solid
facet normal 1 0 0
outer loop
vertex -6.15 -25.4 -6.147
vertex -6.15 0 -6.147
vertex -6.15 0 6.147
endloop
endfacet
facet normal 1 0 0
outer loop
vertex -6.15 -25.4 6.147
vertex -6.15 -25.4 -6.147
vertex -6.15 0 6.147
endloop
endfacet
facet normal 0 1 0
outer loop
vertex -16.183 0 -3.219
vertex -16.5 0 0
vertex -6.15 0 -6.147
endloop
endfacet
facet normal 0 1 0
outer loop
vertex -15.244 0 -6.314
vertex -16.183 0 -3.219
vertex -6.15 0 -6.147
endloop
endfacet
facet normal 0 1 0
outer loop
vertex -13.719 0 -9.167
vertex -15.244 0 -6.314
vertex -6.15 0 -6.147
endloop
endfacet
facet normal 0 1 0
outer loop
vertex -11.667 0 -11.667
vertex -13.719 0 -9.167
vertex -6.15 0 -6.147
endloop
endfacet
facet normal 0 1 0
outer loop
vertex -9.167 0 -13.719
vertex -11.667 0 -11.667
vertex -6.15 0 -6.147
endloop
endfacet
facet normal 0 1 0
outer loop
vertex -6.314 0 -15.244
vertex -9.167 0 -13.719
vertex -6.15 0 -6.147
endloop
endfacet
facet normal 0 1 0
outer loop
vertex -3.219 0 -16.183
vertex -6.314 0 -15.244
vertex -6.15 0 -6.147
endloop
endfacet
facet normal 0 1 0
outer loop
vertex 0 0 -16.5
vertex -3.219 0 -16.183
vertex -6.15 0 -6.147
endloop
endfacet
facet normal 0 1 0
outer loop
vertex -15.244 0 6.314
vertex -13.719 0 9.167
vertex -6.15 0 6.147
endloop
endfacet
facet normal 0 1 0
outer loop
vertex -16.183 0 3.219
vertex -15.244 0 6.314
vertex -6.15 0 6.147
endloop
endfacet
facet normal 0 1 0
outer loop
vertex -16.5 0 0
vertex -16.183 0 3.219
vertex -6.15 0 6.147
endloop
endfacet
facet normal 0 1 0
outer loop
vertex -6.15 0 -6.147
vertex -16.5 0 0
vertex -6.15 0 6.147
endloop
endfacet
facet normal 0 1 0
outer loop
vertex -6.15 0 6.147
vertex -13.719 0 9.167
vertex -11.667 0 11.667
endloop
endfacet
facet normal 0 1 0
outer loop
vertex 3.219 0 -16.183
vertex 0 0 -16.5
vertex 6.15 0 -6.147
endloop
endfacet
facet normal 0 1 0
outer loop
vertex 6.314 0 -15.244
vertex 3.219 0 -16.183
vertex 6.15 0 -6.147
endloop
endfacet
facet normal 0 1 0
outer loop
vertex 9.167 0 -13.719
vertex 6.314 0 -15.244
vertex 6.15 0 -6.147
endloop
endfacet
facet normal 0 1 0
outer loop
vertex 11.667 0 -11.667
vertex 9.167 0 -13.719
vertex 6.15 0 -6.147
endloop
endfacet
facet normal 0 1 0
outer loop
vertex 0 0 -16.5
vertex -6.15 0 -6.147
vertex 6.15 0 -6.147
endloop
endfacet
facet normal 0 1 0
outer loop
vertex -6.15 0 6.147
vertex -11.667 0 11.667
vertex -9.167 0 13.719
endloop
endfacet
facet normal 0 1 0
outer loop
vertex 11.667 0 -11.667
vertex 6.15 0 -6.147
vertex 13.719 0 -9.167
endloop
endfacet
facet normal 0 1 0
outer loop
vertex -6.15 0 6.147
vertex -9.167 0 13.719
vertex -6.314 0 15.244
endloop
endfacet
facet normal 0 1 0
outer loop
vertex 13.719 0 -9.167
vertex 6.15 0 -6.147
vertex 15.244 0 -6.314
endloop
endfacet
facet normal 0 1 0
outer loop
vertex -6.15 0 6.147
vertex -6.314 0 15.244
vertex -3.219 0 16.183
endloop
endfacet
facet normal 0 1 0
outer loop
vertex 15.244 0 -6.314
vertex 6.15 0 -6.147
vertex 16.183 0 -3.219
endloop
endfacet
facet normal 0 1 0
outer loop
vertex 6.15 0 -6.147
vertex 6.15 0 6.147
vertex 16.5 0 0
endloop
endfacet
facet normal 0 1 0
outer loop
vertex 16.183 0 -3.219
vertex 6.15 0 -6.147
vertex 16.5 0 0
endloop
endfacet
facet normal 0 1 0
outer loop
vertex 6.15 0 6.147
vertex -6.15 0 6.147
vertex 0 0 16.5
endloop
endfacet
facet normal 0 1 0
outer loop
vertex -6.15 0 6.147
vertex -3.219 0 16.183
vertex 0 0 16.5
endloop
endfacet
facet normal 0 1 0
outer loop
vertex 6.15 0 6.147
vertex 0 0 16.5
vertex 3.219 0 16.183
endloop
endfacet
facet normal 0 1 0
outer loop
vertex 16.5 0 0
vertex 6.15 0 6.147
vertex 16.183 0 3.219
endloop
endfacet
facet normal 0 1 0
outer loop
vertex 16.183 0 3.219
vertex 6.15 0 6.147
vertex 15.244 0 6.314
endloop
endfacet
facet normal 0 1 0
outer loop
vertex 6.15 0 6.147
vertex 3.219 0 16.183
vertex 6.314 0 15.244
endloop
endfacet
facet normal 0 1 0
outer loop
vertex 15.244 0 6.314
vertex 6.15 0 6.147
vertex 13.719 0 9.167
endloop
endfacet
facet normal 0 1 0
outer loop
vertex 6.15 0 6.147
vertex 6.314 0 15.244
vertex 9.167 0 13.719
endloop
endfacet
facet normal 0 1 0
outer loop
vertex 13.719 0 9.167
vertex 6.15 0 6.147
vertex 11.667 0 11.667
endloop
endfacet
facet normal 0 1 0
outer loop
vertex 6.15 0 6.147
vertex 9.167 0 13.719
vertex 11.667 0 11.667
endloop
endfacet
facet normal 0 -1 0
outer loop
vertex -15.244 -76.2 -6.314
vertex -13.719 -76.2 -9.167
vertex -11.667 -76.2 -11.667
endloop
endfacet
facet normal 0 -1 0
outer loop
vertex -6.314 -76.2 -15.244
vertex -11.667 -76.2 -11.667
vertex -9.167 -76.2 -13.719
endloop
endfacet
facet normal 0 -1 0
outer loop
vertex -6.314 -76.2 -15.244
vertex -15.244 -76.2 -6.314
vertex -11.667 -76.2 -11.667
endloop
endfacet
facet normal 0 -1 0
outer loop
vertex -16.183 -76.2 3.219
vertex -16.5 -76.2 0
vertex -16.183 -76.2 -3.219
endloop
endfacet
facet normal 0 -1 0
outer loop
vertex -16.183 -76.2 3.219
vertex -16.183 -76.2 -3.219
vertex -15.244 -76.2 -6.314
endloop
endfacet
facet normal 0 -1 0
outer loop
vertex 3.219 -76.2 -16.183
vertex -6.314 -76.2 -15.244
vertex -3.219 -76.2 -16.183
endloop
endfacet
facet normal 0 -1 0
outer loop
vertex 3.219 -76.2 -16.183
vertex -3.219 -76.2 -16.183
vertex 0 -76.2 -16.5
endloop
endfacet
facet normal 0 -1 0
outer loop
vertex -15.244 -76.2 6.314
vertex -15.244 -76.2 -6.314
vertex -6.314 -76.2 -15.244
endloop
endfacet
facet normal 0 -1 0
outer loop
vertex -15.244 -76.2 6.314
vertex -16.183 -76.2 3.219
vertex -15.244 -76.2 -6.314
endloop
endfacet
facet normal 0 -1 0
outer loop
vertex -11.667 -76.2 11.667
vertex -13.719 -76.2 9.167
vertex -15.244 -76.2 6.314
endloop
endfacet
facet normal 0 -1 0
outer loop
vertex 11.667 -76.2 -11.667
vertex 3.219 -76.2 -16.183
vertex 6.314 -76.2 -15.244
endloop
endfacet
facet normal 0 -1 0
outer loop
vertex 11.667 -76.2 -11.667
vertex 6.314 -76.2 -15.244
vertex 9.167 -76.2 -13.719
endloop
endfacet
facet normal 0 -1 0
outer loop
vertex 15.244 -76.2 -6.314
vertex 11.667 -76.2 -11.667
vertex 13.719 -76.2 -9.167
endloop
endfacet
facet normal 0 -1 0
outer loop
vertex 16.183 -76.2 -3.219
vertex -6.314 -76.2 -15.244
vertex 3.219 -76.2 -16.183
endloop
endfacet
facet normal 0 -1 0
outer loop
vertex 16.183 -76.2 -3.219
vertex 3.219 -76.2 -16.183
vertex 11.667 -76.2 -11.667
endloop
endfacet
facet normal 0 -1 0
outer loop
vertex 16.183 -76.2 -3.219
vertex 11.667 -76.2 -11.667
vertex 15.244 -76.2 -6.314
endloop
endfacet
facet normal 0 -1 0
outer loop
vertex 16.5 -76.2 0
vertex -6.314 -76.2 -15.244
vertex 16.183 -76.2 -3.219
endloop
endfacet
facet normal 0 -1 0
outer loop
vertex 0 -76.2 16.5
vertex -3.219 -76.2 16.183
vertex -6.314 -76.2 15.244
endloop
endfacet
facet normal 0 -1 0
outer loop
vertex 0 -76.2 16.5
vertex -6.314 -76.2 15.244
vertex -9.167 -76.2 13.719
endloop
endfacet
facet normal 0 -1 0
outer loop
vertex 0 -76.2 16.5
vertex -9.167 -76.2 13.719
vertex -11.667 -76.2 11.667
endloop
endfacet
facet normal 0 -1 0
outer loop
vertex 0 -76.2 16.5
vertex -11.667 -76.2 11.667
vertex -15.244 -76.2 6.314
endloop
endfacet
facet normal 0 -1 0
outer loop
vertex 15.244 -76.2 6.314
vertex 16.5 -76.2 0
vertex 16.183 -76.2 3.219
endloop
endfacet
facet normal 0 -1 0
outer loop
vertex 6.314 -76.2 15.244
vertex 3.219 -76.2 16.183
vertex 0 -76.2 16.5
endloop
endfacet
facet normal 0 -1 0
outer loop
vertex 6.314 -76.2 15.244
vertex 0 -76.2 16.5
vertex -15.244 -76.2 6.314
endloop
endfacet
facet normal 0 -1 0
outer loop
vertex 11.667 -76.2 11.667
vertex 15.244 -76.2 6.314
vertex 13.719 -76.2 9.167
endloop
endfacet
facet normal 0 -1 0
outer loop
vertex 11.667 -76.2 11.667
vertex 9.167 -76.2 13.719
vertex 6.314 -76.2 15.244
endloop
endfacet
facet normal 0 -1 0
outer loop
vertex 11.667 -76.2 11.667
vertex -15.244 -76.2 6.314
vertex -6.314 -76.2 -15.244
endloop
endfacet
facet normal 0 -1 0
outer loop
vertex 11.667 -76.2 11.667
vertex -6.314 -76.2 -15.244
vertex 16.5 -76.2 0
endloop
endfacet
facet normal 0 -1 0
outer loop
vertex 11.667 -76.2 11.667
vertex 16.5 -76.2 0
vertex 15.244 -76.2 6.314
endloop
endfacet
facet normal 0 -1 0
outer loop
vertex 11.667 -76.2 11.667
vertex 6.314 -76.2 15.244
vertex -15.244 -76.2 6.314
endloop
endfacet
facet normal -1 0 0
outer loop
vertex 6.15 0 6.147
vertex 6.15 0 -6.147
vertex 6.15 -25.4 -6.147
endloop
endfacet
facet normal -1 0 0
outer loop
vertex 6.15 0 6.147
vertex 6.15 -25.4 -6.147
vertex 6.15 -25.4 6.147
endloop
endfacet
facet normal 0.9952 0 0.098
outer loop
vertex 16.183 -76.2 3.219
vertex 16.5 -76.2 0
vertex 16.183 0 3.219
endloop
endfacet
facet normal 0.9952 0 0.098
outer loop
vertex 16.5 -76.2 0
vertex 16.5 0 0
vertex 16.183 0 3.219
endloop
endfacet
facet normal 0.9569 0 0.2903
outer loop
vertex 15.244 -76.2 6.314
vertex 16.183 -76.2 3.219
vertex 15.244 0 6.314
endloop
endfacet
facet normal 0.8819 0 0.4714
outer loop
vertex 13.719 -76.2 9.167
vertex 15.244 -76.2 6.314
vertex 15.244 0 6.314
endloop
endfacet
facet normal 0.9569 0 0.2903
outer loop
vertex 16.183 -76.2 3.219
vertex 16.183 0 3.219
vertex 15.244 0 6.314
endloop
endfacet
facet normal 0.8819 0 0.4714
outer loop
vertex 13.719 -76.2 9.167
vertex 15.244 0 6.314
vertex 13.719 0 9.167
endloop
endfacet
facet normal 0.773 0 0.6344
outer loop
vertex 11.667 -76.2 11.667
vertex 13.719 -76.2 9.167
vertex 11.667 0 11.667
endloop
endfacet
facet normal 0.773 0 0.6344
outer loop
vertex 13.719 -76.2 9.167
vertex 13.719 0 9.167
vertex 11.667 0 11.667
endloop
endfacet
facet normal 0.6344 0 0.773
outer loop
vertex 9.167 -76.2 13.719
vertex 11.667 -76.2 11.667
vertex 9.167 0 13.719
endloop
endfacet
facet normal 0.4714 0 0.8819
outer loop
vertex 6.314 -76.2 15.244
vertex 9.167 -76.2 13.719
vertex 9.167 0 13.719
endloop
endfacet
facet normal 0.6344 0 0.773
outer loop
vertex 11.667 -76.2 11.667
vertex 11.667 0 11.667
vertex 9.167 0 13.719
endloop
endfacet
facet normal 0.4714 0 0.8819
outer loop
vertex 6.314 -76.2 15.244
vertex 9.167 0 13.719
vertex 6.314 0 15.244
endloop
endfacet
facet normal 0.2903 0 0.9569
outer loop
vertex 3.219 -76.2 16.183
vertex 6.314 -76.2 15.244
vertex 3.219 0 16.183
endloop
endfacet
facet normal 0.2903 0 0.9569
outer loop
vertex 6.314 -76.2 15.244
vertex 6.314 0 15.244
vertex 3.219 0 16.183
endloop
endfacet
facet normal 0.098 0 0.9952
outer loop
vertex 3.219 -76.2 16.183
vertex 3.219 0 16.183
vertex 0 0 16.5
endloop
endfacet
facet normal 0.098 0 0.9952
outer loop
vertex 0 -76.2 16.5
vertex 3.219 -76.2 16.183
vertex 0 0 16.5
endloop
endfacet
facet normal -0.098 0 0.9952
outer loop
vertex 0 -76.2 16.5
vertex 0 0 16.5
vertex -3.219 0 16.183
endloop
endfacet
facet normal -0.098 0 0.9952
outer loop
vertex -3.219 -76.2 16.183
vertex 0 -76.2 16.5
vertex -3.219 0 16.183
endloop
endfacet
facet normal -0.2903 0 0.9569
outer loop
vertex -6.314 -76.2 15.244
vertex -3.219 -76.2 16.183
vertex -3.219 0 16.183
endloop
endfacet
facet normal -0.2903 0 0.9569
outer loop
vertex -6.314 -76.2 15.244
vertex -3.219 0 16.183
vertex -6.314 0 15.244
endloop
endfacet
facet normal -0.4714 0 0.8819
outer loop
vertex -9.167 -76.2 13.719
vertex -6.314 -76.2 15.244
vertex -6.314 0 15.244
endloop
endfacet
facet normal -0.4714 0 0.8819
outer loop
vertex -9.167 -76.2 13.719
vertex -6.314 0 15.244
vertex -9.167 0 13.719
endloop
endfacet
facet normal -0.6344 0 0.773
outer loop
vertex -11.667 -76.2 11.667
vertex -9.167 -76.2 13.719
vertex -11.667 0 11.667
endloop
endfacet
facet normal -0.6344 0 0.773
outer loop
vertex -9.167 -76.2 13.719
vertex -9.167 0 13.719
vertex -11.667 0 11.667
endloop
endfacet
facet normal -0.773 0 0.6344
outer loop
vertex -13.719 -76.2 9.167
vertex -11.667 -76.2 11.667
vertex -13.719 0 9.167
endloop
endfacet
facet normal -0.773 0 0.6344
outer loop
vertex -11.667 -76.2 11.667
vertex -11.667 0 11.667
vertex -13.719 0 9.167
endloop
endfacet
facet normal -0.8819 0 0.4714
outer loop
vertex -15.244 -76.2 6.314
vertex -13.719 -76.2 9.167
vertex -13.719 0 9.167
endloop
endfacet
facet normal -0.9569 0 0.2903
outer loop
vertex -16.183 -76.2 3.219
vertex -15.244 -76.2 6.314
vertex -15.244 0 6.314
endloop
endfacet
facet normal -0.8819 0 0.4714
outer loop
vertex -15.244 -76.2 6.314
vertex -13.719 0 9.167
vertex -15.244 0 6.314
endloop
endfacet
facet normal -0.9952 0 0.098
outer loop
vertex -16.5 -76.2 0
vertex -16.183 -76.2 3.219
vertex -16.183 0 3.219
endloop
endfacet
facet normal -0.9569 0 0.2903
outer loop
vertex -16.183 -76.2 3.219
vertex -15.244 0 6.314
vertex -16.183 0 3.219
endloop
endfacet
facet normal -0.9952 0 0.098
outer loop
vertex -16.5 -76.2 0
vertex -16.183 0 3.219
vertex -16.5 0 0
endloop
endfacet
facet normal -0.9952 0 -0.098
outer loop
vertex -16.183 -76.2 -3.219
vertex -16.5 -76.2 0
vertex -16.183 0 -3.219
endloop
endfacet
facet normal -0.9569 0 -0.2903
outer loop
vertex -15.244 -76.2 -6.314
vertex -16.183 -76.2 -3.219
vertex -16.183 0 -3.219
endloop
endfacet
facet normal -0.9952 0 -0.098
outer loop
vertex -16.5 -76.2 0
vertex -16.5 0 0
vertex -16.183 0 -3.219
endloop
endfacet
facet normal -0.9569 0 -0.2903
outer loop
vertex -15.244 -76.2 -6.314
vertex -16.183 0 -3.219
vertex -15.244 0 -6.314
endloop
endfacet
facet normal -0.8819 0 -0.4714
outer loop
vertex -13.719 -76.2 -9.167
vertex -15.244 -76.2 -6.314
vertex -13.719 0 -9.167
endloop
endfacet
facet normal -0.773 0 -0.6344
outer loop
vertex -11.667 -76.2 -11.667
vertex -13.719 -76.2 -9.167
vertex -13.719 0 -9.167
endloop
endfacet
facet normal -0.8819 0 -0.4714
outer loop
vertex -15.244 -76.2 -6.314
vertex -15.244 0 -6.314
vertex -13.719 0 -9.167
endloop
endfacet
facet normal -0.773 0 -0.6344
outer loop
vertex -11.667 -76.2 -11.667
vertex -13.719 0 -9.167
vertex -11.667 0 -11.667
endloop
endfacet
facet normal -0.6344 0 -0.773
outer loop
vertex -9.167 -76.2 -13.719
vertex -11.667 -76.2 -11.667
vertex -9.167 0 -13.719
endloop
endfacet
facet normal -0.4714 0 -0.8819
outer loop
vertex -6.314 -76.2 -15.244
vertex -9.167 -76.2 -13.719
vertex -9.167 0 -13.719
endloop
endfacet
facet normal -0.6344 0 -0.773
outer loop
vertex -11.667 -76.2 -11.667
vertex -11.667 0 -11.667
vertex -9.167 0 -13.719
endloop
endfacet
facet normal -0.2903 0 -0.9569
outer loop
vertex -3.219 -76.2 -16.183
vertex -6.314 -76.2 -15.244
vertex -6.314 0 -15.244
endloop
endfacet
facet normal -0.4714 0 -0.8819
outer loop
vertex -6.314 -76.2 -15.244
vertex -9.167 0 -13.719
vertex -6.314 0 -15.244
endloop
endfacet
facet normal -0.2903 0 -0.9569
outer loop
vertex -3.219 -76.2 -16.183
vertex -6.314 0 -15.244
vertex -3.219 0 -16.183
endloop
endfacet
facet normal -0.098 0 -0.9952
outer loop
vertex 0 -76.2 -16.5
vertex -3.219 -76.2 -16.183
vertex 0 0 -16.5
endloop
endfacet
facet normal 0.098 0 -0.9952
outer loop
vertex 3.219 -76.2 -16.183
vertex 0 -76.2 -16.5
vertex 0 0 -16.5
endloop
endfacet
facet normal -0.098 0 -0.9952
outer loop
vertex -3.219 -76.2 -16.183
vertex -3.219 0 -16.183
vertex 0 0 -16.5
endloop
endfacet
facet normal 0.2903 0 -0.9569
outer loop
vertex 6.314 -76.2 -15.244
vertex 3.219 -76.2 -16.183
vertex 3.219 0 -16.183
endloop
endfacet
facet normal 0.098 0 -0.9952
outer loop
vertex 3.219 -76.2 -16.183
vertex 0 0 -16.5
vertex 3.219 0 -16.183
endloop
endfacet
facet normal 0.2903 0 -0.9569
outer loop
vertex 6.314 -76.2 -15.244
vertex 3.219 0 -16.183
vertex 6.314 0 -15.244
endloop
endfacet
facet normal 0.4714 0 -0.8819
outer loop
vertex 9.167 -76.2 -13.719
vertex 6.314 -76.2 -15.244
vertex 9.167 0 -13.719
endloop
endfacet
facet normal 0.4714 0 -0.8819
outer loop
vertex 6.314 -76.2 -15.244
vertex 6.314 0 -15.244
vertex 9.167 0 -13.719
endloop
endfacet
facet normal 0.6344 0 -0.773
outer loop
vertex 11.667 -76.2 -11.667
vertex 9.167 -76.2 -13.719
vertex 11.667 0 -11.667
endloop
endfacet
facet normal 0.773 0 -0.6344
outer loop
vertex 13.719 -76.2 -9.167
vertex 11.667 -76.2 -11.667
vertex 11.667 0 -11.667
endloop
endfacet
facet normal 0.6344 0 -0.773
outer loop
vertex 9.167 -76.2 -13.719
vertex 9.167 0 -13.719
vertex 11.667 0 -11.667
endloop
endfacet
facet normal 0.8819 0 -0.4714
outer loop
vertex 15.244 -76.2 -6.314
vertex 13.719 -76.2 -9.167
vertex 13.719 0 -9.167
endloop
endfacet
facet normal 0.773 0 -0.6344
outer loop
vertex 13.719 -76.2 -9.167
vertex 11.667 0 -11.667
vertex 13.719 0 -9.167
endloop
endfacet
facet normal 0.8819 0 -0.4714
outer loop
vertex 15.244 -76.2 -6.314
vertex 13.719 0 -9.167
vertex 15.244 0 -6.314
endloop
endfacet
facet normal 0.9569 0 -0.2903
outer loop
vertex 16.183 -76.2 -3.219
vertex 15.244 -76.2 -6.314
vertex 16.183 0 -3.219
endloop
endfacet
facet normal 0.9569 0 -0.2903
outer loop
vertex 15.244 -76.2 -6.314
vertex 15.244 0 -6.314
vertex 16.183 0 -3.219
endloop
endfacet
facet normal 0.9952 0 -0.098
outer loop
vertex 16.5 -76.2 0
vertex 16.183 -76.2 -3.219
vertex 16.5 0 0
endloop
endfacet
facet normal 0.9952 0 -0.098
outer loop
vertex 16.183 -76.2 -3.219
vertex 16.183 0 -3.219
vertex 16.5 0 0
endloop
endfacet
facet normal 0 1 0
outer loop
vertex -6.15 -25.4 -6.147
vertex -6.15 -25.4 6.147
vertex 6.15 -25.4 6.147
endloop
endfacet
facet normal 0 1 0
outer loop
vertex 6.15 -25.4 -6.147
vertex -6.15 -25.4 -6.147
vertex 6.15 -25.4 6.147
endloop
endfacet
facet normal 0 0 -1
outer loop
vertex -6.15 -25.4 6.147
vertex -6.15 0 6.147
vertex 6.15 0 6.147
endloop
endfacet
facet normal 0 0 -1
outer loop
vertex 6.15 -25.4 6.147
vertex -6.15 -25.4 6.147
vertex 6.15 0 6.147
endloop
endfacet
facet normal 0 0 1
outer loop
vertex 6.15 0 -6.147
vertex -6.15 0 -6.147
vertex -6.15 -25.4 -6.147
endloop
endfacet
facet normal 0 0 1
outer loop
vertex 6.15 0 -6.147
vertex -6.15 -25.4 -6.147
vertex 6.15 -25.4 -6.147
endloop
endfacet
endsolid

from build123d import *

# Parameters (mm, degrees)
F0_R     = 16.5
F0_W     = 12.3
F0_H     = 12.2936
F1_DEPTH = 25.4
F2_R     = 16.5
F3_DEPTH = 50.8


with BuildPart() as f1:
    # F0 (on Front) → F1 (new body)
    with BuildSketch(Plane.XZ):
        Circle(F0_R)
        Rectangle(F0_W, F0_H, mode=Mode.SUBTRACT)
    extrude(amount=F1_DEPTH)

    # F2 (on face) → F3 (join)
    with BuildSketch(Plane.XZ.offset(25.4)):
        Circle(F2_R)
    extrude(amount=F3_DEPTH)


solid = f1.part
